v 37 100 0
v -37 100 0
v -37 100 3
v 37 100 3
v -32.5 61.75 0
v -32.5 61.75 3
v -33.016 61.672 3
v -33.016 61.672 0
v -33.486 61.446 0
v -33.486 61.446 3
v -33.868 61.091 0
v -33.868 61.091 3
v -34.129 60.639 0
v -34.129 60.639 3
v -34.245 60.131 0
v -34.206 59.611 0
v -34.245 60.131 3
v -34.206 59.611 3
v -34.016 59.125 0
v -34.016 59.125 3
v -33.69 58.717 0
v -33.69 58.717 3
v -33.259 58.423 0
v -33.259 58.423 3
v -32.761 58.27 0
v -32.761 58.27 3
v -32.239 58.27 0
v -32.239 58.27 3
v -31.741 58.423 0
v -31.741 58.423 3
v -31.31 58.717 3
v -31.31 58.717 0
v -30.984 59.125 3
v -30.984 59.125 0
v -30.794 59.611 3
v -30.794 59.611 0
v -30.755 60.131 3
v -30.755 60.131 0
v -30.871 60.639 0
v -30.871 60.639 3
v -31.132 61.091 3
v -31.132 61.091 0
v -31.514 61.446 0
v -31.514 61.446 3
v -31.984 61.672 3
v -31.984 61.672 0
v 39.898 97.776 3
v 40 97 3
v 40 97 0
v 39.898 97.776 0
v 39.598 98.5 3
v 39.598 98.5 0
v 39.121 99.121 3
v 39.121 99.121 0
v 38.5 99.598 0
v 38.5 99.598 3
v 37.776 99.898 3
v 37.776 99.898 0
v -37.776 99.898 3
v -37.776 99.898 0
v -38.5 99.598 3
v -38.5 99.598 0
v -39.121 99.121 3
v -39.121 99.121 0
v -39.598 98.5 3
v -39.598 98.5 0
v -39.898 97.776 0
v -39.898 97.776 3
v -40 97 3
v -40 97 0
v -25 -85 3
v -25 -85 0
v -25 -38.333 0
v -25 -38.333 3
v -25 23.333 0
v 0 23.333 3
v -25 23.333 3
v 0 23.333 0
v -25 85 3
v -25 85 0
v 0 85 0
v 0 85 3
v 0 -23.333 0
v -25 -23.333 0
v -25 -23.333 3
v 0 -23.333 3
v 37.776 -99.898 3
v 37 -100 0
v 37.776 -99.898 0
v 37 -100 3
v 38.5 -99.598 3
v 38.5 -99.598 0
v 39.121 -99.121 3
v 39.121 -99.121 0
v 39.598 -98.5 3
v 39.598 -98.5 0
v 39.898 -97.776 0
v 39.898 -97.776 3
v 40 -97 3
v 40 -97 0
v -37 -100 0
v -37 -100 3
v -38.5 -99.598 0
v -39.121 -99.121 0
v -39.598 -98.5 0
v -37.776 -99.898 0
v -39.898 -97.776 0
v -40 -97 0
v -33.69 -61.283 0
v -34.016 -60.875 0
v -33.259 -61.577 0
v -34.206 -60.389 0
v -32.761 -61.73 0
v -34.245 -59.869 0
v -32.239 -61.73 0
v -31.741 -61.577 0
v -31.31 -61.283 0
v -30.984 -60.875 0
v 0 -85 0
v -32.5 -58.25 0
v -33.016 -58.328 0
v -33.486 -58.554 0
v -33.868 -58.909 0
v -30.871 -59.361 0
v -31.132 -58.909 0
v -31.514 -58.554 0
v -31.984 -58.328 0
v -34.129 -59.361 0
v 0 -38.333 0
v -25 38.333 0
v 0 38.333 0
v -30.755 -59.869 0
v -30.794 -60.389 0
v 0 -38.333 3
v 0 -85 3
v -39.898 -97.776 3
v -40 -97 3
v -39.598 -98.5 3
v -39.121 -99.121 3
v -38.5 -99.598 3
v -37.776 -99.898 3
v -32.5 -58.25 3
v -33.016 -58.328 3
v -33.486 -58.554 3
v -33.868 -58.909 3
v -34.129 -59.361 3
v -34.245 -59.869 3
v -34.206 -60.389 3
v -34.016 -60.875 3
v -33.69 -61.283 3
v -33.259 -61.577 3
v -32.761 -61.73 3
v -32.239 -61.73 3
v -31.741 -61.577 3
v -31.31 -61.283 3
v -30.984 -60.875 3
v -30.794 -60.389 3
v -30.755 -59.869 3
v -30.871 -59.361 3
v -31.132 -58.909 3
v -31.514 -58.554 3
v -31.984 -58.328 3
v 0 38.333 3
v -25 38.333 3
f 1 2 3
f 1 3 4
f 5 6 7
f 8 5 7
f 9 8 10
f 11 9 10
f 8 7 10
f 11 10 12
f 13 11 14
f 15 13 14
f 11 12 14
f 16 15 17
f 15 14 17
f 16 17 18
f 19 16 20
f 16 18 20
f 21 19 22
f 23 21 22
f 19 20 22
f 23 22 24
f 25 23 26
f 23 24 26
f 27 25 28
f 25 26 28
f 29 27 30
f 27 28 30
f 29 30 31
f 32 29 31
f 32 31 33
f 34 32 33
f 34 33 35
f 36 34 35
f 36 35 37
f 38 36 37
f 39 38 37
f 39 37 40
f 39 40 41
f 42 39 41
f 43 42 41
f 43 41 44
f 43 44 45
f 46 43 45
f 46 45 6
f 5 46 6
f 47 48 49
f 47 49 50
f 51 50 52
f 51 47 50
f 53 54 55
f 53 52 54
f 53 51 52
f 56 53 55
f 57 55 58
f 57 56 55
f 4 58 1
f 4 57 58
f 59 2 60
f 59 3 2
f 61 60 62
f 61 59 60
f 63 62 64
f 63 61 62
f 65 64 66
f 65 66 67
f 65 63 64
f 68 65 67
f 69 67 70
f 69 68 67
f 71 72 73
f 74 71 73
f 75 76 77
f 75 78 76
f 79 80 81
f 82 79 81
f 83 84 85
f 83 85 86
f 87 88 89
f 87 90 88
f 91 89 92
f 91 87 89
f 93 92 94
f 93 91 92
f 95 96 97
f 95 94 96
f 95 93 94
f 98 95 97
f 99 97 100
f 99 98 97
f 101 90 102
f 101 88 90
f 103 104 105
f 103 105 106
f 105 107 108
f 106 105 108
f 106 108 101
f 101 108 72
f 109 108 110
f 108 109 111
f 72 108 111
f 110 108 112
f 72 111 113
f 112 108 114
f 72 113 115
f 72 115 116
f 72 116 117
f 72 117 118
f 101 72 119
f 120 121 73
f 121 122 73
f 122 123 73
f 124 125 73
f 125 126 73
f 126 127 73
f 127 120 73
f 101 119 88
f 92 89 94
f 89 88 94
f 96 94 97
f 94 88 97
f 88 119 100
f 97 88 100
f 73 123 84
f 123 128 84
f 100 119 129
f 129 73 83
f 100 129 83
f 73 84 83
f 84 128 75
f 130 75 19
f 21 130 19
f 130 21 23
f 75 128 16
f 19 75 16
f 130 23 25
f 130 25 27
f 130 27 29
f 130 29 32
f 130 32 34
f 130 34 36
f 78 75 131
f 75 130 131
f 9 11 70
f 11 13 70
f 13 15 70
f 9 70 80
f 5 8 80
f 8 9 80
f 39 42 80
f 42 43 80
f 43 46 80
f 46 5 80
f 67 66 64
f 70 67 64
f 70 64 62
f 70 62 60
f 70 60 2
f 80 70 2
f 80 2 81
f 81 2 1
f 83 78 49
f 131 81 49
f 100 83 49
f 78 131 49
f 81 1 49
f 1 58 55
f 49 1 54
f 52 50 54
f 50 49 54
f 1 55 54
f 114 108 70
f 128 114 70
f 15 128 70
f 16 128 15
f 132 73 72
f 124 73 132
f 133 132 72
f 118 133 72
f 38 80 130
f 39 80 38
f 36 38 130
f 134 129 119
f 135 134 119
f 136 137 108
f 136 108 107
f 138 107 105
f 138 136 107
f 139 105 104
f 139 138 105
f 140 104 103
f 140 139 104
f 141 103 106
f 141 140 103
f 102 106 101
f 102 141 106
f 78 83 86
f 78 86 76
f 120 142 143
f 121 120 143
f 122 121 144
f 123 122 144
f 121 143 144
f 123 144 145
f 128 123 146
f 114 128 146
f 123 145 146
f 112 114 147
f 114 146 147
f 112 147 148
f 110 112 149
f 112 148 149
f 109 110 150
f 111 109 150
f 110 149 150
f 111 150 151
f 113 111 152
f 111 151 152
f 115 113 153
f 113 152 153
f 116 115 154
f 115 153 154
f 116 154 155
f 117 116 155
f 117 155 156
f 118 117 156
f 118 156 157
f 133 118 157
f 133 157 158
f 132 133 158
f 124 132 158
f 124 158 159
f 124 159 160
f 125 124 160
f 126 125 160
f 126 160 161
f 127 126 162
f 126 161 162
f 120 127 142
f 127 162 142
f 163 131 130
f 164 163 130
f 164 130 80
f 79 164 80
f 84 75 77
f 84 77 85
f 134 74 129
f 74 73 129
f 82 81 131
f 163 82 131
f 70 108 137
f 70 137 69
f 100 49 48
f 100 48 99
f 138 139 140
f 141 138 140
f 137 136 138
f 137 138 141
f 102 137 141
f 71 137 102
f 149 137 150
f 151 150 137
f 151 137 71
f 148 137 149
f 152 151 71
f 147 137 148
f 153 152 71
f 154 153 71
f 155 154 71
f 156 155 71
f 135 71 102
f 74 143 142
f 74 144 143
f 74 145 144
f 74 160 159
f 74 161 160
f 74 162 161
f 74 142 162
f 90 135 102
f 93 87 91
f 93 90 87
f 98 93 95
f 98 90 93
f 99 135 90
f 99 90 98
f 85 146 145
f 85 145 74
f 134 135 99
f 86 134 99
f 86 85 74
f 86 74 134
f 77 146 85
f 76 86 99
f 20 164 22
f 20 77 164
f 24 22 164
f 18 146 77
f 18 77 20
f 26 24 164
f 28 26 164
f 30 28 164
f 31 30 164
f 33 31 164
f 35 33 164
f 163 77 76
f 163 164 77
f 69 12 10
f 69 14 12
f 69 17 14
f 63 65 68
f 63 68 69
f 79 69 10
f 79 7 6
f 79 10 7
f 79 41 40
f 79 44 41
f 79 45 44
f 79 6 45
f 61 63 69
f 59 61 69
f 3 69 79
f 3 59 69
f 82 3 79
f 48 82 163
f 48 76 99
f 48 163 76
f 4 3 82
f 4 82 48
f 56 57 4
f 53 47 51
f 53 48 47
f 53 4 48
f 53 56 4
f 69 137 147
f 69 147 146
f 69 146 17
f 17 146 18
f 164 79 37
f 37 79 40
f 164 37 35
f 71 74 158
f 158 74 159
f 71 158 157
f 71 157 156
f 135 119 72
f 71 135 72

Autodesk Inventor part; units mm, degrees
ref_plane "YZ Plane" through (0, 0, 0) normal (1, 0, 0) x (0, 1, 0)
ref_plane "XZ Plane" through (0, 0, 0) normal (0, 1, 0) x (-1, 0, 0)
ref_plane "XY Plane" through (0, 0, 0) normal (0, 0, 1) x (1, 0, 0)
sketch "Sketch1" plane through (0, 0, 0) normal (0, 0, 1) x (1, 0, 0)
  line L0 (-40, 100) -> (40, 100)
  line L1 (40, 100) -> (40, -100)
  line L2 (40, -100) -> (-40, -100)
  line L3 (-40, -100) -> (-40, 100)
  line L4 (-40, 100) -> (40, -100) construction
  line L5 (40, 100) -> (-40, -100) construction
  point P0 (0, 0)
  dimension "d0" = 80
  dimension "d1" = 200
extrude "Extrusion1" add sketch "Sketch1" along normal blind 3
sketch "Sketch2" plane through (0, 0, 0) normal (0, 0, -1) x (-1, 0, 0)
  line L0 (40, -100) -> (-40, -100) projected
  line L1 (40, 100) -> (40, -100) projected
  line L2 (-40, 100) -> (40, 100) projected
  line L3 (-40, -100) -> (-40, 100) projected
  point P0 (0, 0)
  point P1 (32.5, -60)
  point P2 (32.5, 60)
  dimension "d4" = 7.5
  dimension "d5" = 7.5
  dimension "d6" = 40
  dimension "d7" = 40
hole "Hole1" at (-32.5, -60, 0) at (-32.5, 60, 0) direction (0, 0, 1) diameter 3.5 end through all
fillet "Fillet1" radius 3 4 edges at (-40, -100, 1.5) (40, -100, 1.5) (40, 100, 1.5) (-40, 100, 1.5)
sketch "Sketch3" plane through (0, 0, 0) normal (0, 0, -1) x (-1, 0, 0)
  arc A0 (40, 97) -> (37, 100) centre (37, 97) ccw projected
  line L0 (-37, 100) -> (37, 100) projected
  arc A1 (-37, 100) -> (-40, 97) centre (-37, 97) ccw projected
  line L1 (-40, -97) -> (-40, 97) projected
  arc A2 (-40, -97) -> (-37, -100) centre (-37, -97) ccw projected
  line L2 (37, -100) -> (-37, -100) projected
  arc A3 (37, -100) -> (40, -97) centre (37, -97) ccw projected
  line L3 (40, 97) -> (40, -97) projected
  circle A4 centre (32.5, -60) radius 1.75 projected
  circle A5 centre (32.5, 60) radius 1.75 projected
  line L4 (0, -85) -> (25, -85)
  line L5 (25, -85) -> (25, -38.3333)
  line L6 (25, -38.3333) -> (0, -38.3333)
  line L7 (0, -38.3333) -> (0, -85)
  line L8 (25, 85) -> (0, 85)
  line L9 (0, 85) -> (0, 38.3333)
  line L10 (0, 38.3333) -> (25, 38.3333)
  line L11 (25, 38.3333) -> (25, 85)
  line L12 (25, -23.3333) -> (0, -23.3333)
  line L13 (0, -23.3333) -> (0, 23.3333)
  line L14 (0, 23.3333) -> (25, 23.3333)
  line L15 (25, 23.3333) -> (25, -23.3333)
  point P0 (0, 0)
  point P1 (12.5, -23.3333)
  dimension "d16" = 15
  dimension "d17" = 15
  dimension "d18" = 15
  dimension "d19" = 15
  dimension "d20" = 15
  dimension "d21" = 25
extrude "Extrusion2" cut sketch "Sketch3" against normal through all contours L7 L6 L5 L4 | L11 L10 L9 L8 | L12 L13 L14 L15
equation "\"d5\" = d4"
equation "\"d7\" = d6"
equation "\"d17\" = d16"
equation "\"d18\" = d16"
equation "\"d19\" = d16"
properties part number "Drag Chain Guide Z Axis" material "Aluminum 6061"
